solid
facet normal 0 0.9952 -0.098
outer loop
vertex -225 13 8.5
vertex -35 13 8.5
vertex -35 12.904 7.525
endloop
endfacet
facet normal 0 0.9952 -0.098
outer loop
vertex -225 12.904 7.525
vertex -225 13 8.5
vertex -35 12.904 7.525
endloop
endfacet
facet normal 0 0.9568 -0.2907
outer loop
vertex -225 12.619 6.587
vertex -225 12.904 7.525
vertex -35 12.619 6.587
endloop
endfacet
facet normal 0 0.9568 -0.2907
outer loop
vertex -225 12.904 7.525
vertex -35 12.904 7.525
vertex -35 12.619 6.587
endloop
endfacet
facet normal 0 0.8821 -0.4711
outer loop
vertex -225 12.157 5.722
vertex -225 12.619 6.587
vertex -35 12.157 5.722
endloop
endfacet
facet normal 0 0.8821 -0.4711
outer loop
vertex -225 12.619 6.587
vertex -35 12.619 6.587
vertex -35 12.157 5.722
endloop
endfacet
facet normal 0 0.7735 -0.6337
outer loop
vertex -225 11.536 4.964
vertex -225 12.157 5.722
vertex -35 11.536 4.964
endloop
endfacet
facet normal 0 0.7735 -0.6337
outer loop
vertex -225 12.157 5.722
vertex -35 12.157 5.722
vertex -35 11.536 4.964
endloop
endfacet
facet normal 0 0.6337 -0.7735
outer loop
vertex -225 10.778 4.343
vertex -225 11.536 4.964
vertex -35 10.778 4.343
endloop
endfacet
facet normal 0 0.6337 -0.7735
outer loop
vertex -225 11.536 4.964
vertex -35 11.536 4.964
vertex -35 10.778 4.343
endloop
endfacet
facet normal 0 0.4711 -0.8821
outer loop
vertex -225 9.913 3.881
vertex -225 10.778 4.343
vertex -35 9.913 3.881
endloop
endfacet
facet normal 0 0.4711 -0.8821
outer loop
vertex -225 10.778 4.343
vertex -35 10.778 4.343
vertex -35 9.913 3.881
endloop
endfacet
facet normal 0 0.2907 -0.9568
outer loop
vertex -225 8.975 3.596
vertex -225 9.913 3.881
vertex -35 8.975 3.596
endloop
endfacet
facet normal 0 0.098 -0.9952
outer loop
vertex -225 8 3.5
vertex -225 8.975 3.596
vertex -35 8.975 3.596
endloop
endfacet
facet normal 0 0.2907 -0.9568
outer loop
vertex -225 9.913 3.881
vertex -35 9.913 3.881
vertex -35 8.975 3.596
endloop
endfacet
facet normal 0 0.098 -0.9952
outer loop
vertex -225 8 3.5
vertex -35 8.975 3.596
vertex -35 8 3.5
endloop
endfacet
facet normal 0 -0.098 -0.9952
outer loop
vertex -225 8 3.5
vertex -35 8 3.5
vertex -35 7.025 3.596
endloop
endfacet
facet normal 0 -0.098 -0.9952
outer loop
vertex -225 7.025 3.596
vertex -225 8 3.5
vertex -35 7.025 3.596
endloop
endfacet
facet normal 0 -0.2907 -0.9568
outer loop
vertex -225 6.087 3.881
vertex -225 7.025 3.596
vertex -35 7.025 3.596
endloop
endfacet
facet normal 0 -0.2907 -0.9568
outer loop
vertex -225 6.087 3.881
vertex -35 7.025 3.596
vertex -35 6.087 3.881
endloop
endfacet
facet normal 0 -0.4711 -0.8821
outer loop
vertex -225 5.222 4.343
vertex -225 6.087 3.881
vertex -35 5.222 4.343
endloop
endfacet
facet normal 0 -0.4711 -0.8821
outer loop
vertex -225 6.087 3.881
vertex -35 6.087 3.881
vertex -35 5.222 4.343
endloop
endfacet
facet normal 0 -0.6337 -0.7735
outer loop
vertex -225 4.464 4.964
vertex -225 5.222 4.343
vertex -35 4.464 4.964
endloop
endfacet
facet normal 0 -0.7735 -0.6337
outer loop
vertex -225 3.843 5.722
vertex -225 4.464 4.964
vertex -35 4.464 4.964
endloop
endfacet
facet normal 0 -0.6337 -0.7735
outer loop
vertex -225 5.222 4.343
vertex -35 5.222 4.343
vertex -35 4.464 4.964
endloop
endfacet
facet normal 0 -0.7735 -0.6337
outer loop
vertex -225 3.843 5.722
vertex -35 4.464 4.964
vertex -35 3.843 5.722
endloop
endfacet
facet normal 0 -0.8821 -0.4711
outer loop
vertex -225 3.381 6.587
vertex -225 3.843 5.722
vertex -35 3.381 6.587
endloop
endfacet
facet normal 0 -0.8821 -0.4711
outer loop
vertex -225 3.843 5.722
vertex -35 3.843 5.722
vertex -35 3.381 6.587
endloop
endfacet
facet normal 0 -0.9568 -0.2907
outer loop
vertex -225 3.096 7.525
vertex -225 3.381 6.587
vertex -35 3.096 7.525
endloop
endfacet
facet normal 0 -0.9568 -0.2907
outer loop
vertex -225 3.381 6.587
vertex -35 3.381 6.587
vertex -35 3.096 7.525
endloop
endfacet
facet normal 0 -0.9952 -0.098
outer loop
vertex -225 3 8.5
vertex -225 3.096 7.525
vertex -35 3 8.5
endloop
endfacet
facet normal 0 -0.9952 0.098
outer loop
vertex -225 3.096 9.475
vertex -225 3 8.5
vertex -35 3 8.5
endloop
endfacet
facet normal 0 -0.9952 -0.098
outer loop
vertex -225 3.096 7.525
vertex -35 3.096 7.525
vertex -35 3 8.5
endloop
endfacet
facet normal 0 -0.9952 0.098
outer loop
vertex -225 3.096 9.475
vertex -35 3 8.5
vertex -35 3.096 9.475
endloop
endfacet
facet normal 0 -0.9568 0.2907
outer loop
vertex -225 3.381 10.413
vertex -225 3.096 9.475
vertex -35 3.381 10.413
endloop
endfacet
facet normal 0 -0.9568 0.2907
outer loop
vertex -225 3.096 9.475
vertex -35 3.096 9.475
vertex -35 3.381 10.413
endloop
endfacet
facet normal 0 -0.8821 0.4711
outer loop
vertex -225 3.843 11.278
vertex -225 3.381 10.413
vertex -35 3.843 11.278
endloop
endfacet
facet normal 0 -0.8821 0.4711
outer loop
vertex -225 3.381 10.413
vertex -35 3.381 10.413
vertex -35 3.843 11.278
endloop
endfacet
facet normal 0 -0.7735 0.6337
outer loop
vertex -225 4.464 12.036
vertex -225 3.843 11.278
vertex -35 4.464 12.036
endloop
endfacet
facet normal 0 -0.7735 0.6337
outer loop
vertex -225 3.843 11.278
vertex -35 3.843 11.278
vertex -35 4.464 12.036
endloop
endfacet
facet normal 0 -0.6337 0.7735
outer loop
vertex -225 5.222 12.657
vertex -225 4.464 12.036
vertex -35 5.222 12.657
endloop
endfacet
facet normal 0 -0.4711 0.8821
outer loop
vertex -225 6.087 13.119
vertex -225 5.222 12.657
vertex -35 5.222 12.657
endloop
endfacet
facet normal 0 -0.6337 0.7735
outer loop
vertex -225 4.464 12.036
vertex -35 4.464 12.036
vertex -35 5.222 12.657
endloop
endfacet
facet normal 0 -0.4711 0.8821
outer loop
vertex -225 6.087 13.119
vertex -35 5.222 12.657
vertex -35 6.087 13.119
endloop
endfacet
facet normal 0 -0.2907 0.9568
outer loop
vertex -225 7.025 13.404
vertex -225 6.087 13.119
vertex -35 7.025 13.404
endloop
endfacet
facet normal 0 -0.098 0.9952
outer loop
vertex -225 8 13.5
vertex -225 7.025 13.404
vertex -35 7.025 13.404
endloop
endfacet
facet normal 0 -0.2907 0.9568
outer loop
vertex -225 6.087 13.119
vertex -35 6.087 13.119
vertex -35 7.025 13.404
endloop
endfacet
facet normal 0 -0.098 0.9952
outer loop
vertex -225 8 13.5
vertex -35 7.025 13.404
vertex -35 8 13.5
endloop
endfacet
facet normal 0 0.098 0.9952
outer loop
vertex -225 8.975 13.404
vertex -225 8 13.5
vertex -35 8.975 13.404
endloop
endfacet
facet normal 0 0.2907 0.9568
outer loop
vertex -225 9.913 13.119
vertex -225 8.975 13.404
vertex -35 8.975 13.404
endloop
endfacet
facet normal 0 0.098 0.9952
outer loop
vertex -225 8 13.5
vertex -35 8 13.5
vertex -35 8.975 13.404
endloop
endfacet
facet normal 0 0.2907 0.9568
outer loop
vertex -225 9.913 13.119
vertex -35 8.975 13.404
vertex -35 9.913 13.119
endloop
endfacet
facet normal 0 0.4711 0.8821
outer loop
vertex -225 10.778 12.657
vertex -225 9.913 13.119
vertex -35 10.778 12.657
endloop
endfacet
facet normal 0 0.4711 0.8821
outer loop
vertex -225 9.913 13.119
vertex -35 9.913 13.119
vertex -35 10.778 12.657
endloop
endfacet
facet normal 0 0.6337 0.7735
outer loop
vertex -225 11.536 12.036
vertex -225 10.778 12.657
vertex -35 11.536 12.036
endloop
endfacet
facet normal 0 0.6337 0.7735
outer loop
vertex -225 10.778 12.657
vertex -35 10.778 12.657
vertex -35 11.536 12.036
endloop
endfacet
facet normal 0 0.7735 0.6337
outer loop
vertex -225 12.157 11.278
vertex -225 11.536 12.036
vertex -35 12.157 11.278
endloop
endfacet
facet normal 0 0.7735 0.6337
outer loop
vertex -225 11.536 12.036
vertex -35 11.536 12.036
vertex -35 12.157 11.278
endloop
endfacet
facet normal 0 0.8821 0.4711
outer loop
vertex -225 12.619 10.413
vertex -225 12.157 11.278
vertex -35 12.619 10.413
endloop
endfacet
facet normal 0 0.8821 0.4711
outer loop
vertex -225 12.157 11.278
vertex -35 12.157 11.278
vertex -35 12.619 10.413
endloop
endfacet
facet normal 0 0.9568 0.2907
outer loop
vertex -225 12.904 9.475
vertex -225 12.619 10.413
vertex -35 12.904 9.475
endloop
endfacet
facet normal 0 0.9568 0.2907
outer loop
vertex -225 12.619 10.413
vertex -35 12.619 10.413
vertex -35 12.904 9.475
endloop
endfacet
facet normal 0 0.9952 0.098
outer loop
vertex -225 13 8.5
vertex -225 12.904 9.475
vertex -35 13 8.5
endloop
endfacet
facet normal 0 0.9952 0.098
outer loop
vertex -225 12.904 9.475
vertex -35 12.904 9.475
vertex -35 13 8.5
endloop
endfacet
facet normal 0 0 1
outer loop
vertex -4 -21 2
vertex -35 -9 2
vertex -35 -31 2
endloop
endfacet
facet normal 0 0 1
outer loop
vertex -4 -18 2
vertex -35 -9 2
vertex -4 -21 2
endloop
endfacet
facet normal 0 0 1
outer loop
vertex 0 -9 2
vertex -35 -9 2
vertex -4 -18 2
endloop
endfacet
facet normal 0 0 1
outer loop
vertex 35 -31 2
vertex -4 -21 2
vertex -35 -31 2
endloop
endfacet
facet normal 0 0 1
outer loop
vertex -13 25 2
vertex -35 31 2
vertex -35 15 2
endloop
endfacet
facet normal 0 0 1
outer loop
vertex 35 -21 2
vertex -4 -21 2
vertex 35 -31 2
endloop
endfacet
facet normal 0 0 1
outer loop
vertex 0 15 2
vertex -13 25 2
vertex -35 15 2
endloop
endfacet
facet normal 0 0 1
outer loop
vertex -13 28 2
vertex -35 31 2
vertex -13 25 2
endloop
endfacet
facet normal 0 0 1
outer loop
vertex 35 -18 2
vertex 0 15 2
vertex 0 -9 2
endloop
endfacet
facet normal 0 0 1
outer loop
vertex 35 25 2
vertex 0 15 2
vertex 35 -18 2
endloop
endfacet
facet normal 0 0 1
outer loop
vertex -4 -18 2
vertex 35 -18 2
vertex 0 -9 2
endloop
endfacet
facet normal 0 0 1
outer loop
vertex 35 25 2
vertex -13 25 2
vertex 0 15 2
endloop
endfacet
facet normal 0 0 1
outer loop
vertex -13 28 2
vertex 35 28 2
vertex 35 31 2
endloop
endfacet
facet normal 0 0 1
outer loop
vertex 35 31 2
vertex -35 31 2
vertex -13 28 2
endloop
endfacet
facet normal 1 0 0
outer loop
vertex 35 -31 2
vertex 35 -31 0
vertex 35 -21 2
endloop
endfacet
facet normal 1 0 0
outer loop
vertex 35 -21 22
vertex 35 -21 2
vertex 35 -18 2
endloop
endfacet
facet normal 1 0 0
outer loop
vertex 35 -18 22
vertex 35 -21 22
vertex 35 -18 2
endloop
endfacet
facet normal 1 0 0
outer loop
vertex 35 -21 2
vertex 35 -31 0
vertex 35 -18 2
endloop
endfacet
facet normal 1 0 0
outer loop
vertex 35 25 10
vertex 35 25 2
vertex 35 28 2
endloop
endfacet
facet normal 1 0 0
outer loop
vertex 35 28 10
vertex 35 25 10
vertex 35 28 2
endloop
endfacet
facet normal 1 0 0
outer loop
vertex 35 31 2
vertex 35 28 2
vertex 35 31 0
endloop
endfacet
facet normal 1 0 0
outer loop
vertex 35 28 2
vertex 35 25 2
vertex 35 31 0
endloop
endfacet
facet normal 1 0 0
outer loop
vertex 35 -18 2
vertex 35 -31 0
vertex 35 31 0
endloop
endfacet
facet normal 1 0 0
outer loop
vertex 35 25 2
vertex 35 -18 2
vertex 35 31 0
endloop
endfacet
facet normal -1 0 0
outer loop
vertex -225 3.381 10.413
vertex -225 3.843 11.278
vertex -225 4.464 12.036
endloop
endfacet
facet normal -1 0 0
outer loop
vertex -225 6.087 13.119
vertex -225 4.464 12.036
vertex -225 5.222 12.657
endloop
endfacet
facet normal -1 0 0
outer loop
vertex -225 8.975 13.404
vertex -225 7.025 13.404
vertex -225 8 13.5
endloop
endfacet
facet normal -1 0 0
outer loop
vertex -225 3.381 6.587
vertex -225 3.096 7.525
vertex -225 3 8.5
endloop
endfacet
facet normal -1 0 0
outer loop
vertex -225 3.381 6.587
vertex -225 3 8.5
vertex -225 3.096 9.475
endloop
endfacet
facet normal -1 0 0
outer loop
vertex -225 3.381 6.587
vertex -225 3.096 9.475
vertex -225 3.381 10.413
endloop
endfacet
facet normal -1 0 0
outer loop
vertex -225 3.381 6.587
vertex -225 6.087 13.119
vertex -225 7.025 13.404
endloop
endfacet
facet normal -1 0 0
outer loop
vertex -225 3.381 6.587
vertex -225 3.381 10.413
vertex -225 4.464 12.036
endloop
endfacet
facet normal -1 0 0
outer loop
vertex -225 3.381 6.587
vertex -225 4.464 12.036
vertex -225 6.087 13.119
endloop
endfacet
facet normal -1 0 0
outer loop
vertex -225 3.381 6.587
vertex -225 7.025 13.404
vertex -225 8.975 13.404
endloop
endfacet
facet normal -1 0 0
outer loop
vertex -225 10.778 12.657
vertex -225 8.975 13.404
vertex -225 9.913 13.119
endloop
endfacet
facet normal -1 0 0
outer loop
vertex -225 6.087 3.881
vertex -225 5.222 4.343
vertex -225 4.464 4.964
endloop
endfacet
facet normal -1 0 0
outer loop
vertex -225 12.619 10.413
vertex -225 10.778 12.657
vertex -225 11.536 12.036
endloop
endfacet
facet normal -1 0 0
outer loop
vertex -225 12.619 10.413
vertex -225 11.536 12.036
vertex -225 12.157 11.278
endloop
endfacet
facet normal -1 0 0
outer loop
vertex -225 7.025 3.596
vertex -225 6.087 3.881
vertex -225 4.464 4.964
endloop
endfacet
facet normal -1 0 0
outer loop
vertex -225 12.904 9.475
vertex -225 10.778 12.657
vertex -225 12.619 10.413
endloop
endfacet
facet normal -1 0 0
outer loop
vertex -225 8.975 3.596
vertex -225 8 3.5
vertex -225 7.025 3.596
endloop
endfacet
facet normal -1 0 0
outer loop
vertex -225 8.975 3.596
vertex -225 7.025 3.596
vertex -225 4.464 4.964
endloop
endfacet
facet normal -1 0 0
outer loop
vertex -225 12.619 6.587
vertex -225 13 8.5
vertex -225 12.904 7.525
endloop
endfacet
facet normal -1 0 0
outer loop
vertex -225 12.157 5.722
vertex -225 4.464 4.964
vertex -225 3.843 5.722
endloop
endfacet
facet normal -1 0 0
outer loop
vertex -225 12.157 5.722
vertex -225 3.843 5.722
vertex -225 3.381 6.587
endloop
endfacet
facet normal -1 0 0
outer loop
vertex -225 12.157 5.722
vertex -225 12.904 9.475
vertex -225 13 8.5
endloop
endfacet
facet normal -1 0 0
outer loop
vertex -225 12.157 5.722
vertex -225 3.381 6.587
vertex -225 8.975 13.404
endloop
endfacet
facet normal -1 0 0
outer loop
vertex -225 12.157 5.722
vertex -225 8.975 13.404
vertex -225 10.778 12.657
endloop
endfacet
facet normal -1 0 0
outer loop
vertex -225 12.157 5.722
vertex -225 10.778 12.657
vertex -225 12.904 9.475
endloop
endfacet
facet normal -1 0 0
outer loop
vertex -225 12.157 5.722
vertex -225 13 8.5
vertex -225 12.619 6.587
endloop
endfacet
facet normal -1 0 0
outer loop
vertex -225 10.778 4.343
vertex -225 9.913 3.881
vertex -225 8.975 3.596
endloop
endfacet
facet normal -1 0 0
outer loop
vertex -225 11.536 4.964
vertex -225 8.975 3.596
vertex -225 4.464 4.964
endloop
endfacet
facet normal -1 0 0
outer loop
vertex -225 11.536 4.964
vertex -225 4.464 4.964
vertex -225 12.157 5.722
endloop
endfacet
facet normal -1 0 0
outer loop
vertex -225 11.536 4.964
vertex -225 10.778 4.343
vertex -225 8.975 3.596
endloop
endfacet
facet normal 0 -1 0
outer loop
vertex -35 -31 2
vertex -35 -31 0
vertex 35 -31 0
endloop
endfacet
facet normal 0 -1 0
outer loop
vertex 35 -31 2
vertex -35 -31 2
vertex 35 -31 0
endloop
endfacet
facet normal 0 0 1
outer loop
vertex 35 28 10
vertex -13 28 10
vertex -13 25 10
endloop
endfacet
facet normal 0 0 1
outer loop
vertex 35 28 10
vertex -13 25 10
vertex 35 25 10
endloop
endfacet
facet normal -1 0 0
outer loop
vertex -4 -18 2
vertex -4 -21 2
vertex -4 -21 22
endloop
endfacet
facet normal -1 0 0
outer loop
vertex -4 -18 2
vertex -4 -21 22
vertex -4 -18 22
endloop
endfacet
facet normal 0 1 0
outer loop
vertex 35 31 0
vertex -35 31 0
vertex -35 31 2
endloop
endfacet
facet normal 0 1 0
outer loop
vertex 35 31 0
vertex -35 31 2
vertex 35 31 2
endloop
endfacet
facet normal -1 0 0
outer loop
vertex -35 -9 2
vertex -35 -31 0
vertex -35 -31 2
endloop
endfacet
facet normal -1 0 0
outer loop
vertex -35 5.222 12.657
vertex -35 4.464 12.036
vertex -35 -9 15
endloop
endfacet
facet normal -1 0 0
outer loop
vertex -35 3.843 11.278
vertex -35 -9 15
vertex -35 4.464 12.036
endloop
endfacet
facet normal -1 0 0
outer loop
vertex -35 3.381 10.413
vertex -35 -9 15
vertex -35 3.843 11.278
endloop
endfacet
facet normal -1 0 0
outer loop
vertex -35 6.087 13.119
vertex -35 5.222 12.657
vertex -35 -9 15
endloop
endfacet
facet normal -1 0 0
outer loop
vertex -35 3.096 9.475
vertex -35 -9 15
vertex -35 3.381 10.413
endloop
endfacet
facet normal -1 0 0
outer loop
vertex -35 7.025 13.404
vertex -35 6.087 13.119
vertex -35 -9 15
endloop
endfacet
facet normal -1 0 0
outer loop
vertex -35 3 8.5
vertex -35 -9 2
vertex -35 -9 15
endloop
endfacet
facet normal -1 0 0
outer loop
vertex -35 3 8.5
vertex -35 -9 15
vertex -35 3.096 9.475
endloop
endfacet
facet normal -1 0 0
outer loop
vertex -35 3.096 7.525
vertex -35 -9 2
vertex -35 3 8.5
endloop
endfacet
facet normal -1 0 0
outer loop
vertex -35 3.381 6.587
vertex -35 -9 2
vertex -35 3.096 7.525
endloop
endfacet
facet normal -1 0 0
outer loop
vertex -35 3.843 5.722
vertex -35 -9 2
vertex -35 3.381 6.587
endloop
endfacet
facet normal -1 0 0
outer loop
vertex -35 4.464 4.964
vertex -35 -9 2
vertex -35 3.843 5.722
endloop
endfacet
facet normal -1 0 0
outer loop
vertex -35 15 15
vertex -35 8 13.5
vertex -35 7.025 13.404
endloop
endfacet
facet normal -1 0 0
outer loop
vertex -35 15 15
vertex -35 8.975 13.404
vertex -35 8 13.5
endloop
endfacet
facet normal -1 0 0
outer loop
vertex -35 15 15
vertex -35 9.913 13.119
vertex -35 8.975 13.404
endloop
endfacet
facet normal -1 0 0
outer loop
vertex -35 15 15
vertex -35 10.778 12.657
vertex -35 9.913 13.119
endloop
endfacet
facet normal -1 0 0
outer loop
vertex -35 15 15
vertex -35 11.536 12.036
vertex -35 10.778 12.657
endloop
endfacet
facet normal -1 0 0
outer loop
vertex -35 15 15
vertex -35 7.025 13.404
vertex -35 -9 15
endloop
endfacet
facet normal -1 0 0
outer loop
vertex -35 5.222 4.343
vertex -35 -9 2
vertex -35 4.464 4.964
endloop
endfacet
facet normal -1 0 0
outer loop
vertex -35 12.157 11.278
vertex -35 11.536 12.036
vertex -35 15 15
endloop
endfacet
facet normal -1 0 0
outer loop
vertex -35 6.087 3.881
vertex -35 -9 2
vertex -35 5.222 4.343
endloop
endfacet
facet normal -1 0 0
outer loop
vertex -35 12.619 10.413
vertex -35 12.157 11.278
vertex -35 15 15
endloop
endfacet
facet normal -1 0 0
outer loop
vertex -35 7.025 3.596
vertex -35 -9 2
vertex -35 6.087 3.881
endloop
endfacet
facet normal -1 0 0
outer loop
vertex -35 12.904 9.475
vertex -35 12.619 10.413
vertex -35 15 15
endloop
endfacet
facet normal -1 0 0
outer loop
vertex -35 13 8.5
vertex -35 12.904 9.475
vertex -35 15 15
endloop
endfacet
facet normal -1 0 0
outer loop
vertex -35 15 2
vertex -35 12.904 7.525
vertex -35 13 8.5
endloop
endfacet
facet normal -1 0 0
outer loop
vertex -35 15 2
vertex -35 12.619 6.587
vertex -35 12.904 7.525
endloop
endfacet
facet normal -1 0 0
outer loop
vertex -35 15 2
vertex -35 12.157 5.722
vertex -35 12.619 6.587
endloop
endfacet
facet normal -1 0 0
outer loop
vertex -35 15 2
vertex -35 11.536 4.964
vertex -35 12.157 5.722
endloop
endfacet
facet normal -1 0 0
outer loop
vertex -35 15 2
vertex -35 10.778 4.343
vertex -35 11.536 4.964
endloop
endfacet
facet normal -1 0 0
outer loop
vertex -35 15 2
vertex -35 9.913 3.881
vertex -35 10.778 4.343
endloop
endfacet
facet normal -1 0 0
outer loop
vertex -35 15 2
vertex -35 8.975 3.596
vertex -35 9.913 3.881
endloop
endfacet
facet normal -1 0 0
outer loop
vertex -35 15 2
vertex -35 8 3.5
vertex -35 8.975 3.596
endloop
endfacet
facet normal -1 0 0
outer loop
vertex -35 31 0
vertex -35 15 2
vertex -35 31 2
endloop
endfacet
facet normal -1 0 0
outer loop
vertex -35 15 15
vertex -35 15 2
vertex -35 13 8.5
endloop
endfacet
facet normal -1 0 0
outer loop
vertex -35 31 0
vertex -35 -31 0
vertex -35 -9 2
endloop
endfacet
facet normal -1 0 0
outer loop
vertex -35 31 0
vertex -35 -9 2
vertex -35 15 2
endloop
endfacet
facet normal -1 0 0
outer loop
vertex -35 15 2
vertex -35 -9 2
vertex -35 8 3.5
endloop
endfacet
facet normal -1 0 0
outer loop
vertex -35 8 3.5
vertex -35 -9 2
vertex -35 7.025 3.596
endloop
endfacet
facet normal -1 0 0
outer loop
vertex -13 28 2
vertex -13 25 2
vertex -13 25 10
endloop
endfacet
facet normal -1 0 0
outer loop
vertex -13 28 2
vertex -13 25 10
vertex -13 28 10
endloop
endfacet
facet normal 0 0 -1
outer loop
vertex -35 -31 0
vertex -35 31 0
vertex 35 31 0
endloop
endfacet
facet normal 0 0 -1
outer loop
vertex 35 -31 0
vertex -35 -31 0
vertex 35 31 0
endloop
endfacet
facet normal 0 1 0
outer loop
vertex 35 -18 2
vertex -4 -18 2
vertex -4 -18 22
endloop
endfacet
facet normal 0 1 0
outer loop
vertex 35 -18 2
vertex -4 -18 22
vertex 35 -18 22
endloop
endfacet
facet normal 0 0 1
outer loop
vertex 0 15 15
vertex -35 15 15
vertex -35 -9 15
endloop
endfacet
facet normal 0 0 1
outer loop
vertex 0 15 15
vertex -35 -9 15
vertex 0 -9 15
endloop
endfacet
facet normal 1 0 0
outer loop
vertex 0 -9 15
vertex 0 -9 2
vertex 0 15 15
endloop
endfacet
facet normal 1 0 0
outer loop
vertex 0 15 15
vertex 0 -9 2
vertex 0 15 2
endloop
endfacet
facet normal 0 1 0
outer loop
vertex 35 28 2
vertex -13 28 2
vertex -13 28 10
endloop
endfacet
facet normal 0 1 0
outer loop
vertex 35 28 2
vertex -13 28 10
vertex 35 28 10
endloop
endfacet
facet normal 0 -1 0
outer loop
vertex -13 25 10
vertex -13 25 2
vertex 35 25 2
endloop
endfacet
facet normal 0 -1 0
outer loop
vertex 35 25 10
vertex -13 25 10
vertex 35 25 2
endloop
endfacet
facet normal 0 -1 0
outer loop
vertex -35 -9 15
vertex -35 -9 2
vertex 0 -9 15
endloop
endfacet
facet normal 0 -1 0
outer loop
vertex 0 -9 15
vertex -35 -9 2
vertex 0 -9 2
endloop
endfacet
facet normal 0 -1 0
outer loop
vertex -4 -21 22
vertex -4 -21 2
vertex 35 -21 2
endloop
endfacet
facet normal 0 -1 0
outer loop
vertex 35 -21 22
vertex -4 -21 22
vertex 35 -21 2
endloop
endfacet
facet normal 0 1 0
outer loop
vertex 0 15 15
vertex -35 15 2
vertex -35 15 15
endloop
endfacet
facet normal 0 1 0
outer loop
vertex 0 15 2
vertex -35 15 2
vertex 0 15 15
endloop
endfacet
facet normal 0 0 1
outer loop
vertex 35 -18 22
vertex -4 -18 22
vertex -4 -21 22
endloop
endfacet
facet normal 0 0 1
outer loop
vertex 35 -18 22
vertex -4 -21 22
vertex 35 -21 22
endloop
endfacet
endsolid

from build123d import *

# Parameters (mm, degrees)
ESQUISSE1_W        = 70
ESQUISSE1_H        = 62
BOSS_EXTRU_1_DEPTH = 2
ESQUISSE2_W        = 35
ESQUISSE2_H        = 24
BOSS_EXTRU_2_DEPTH = 15
ESQUISSE3_W        = 39
ESQUISSE3_H        = 3
BOSS_EXTRU_3_DEPTH = 22
ESQUISSE4_W        = 48
ESQUISSE4_H        = 3
BOSS_EXTRU_4_DEPTH = 10
ESQUISSE5_R        = 5
BOSS_EXTRU_5_DEPTH = 190


with BuildPart() as part:
    # Esquisse1 → Boss.-Extru.1 (new body)
    with BuildSketch(Plane.XY):
        Rectangle(ESQUISSE1_W, ESQUISSE1_H)
    extrude(amount=BOSS_EXTRU_1_DEPTH)

    # Esquisse2 → Boss.-Extru.2 (add)
    with BuildSketch(Plane.XY):
        with Locations((-17.5, 3)):
            Rectangle(ESQUISSE2_W, ESQUISSE2_H)
    extrude(amount=BOSS_EXTRU_2_DEPTH)

    # Esquisse3 → Boss.-Extru.3 (add)
    with BuildSketch(Plane.XY):
        with Locations((15.5, -19.5)):
            Rectangle(ESQUISSE3_W, ESQUISSE3_H)
    extrude(amount=BOSS_EXTRU_3_DEPTH)

    # Esquisse4 → Boss.-Extru.4 (add)
    with BuildSketch(Plane.XY):
        with Locations((11, 26.5)):
            Rectangle(ESQUISSE4_W, ESQUISSE4_H)
    extrude(amount=BOSS_EXTRU_4_DEPTH)

    # Esquisse5 → Boss.-Extru.5 (add)
    with BuildSketch(Plane.ZY.offset(35)):
        with Locations(Location((8.5, 8, 0), (0, 0, 90))):
            Circle(ESQUISSE5_R)
    extrude(amount=BOSS_EXTRU_5_DEPTH)


solid = part.part
